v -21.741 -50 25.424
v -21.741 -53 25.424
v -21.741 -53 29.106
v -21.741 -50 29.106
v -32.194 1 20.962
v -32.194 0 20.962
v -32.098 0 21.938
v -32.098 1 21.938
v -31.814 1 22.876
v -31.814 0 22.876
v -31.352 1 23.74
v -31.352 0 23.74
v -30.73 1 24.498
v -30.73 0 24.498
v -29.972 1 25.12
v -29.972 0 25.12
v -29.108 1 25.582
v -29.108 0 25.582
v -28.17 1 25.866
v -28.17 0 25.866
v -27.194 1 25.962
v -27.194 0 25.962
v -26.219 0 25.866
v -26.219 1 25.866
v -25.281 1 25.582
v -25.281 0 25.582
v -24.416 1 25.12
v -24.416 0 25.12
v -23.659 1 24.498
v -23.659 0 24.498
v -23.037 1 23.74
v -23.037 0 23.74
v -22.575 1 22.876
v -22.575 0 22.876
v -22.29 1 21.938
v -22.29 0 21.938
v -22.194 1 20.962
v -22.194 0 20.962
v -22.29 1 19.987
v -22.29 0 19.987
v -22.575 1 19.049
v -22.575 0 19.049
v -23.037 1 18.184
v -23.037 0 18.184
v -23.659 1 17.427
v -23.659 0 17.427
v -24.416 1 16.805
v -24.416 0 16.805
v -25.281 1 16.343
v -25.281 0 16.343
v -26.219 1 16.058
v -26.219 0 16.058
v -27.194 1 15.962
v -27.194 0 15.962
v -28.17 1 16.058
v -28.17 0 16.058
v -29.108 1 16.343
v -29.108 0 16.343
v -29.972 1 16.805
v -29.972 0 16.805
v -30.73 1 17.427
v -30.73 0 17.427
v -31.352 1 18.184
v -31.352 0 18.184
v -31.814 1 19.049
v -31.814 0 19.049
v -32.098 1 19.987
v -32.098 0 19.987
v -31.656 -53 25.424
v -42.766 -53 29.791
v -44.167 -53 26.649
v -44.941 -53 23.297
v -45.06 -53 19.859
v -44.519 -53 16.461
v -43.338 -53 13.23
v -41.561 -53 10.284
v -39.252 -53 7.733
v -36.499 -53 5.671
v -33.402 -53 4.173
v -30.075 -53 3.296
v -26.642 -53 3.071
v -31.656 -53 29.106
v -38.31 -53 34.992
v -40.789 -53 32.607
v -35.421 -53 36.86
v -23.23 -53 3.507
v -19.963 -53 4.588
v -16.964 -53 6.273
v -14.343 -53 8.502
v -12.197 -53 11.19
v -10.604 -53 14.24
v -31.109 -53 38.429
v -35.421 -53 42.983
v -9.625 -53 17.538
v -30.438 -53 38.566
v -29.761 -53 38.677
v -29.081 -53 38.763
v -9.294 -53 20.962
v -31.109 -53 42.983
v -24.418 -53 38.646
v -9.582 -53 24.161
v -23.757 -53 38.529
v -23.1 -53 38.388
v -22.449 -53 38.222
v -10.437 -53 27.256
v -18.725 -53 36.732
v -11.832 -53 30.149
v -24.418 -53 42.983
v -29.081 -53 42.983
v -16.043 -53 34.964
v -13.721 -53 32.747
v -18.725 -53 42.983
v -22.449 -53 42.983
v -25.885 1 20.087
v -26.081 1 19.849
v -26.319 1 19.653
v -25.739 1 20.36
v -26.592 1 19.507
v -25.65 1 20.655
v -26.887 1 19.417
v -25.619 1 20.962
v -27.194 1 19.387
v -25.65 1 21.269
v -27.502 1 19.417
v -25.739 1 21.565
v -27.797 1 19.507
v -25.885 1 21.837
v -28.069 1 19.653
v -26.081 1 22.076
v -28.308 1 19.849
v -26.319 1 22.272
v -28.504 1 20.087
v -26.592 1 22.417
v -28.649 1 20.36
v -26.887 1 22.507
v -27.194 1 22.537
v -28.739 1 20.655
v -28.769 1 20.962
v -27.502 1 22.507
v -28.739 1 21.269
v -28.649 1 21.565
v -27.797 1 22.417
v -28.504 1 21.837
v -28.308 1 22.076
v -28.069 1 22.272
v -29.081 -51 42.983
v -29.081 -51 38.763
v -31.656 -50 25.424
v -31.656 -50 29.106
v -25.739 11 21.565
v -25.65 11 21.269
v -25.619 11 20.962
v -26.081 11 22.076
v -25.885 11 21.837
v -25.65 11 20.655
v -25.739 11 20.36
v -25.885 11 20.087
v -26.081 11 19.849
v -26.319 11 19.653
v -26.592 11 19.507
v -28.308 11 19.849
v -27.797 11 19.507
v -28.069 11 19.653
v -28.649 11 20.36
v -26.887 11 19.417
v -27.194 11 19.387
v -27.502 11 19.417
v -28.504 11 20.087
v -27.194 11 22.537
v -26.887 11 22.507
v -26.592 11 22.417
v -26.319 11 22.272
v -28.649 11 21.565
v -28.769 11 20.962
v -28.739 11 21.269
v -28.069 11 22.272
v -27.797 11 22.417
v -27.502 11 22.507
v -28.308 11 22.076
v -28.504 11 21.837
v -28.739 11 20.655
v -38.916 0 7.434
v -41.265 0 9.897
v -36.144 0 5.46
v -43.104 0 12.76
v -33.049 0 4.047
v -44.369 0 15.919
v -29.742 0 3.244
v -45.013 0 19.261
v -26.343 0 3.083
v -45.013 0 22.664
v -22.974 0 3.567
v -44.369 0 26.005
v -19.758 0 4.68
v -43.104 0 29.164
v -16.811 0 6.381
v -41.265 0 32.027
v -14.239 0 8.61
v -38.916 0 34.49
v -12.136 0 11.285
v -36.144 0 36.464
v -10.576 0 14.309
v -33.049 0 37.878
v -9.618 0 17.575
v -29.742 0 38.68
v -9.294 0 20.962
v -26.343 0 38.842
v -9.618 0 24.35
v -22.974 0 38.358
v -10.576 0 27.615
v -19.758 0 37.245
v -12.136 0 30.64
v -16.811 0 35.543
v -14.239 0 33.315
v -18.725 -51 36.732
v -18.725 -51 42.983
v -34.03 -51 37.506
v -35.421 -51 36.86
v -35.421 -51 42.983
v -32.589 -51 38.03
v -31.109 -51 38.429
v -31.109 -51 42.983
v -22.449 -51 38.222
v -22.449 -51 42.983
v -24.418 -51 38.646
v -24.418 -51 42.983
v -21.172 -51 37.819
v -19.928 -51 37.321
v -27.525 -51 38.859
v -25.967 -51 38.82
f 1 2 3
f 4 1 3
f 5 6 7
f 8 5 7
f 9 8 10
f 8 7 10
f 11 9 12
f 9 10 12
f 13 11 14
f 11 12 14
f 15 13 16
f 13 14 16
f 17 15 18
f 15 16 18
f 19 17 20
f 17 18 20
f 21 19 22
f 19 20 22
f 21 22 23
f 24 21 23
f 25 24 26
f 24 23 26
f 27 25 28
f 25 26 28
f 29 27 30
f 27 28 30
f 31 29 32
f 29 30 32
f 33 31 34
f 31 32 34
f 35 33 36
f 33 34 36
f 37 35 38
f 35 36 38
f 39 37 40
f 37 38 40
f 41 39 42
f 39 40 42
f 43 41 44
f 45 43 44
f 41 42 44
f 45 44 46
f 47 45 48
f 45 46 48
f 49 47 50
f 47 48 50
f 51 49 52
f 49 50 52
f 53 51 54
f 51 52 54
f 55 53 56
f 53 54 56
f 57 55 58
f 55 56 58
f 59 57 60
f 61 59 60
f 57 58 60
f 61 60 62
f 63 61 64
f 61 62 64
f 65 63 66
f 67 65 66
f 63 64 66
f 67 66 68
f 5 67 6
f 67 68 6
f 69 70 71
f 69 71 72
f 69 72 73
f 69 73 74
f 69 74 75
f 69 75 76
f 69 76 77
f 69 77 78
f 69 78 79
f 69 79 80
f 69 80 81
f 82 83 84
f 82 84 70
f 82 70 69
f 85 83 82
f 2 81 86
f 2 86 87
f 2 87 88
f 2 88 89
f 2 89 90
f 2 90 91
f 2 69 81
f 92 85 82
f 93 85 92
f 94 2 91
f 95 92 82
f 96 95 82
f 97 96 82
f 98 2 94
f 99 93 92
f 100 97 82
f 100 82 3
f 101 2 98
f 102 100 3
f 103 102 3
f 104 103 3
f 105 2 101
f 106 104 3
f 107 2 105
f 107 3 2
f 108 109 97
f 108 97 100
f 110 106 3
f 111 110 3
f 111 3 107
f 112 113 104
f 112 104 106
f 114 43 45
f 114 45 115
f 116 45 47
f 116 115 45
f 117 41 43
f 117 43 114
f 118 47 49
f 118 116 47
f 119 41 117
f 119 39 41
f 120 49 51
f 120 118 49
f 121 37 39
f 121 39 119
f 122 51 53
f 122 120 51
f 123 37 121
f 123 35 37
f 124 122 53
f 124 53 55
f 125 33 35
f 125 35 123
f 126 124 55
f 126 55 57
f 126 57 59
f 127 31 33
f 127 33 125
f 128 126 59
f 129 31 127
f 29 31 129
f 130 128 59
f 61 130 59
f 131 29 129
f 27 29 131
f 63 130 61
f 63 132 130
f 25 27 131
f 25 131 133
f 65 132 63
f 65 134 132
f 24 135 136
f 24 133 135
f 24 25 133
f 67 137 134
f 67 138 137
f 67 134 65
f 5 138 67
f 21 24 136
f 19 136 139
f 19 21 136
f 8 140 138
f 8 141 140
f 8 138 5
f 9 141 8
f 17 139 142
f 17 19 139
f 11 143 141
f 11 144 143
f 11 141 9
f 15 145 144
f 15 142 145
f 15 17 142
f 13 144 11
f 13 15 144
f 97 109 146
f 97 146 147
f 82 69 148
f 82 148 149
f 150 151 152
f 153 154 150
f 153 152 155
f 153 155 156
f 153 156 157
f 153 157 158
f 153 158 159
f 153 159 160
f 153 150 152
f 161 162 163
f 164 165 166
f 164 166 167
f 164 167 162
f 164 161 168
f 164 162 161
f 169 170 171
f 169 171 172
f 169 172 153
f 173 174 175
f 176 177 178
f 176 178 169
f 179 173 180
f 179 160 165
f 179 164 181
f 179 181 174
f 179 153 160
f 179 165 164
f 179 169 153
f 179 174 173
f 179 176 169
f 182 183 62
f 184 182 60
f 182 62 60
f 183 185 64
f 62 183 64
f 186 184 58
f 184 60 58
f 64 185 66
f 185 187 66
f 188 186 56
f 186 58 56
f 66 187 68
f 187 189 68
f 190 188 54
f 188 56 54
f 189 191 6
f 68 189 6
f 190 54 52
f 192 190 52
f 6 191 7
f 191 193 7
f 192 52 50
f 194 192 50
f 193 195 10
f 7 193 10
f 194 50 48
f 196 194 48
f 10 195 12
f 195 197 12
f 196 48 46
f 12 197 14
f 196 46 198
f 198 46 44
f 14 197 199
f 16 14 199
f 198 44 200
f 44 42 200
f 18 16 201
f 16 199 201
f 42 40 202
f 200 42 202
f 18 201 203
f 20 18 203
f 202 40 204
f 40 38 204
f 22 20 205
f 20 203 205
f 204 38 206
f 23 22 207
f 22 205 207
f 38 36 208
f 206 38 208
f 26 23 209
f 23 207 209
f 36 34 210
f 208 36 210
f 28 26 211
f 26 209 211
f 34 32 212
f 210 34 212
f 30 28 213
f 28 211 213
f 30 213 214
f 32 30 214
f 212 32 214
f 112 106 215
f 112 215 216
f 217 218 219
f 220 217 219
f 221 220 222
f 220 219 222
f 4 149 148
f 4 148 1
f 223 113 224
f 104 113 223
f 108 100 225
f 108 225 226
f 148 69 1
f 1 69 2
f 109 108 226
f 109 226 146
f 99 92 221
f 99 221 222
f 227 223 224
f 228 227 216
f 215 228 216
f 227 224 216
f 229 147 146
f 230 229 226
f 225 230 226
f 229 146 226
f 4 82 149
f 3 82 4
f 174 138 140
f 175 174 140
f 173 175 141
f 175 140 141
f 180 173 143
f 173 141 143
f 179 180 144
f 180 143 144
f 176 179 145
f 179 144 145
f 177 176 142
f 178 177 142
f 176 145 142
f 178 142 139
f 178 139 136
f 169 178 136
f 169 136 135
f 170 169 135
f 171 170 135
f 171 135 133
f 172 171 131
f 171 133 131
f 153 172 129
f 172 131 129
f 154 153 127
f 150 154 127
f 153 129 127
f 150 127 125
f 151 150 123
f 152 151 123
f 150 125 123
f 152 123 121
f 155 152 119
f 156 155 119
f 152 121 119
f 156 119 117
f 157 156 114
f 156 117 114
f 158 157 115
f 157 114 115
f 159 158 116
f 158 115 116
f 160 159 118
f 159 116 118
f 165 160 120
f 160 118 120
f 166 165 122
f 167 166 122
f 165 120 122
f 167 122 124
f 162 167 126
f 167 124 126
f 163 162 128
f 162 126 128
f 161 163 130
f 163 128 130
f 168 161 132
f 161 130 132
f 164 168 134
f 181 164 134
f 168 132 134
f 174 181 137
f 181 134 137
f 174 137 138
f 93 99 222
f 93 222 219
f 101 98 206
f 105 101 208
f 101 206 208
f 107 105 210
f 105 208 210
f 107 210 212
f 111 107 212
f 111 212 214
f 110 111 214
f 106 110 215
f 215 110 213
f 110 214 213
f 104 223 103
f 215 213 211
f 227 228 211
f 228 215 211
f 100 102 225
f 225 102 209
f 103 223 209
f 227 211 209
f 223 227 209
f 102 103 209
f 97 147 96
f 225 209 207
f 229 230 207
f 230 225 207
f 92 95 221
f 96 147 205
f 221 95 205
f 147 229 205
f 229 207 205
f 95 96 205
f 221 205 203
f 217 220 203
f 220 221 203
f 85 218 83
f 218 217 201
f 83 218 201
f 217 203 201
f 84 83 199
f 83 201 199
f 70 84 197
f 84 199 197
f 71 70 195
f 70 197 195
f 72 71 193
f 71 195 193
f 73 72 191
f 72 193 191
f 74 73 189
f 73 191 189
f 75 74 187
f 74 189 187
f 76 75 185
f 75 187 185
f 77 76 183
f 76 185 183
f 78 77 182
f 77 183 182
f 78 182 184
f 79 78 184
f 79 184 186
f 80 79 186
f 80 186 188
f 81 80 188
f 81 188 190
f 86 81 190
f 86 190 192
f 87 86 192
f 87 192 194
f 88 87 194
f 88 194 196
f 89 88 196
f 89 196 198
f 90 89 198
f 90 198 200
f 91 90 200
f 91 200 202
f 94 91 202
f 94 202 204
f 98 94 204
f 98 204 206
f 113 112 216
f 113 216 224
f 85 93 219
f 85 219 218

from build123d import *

# Parameters (mm, degrees)
F0_R     = 17.9
F1_DEPTH = 53
F2_R     = 5
F3_DEPTH = 1
F4_R     = 1.575
F5_DEPTH = 10
F6_W     = 9.9145695567
F6_H     = 3.6825537682
F7_DEPTH = 3
F9_DEPTH = 2


with BuildPart() as f1:
    # F0 (on Front) → F1 (new body)
    with BuildSketch(Plane.XZ):
        with Locations((-27.1942447871, 20.9622308612)):
            Circle(F0_R)
    extrude(amount=F1_DEPTH)

    # F2 (on face) → F3 (join)
    with BuildSketch(Plane(origin=(0, 0, 0), x_dir=(-1, 0, 0), z_dir=(0, 1, 0))):
        with Locations((27.1942447871, 20.9622308612)):
            Circle(F2_R)
    extrude(amount=F3_DEPTH)

    # F4 (on face) → F5 (join)
    with BuildSketch(Plane(origin=(0, 1, 0), x_dir=(-1, 0, 0), z_dir=(0, 1, 0))):
        with Locations((27.1942447871, 20.9622308612)):
            Circle(F4_R)
    extrude(amount=F5_DEPTH)

    # F6 (on face) → F7 (cut)
    with BuildSketch(Plane.XZ.offset(53)):
        with Locations((-26.6985148191, 27.265066281)):
            Rectangle(F6_W, F6_H)
    extrude(amount=-F7_DEPTH, mode=Mode.SUBTRACT)

    # F8 (on face) → F9 (join)
    with BuildSketch(Plane.XZ.offset(53)):
        with BuildLine():
            Line((-35.4207989488, 42.9829595067), (-35.4207989488, 36.8598346626))
            ThreePointArc((-35.4207989488, 36.8598346626), (-33.3154303096, 37.7830836279), (-31.1090964824, 38.428882979))
            Line((-31.1090964824, 38.428882979), (-31.1090964824, 42.9829595067))
            Line((-31.1090964824, 42.9829595067), (-35.4207989488, 42.9829595067))
        make_face()
        with BuildLine():
            Line((-29.0810409933, 42.9829595067), (-29.0810409933, 38.76251176))
            ThreePointArc((-29.0810409933, 38.76251176), (-26.7457383718, 38.8566110403), (-24.4180820882, 38.6456389227))
            Line((-24.4180820882, 38.6456389227), (-24.4180820882, 42.9829595067))
            Line((-24.4180820882, 42.9829595067), (-29.0810409933, 42.9829595067))
        make_face()
        with BuildLine():
            ThreePointArc((-22.4494244903, 38.2219145301), (-20.5451738039, 37.5814924291), (-18.7246836722, 36.7317119725))
            Line((-18.7246836722, 36.7317119725), (-18.7246836722, 42.9829595067))
            Line((-18.7246836722, 42.9829595067), (-22.4494244903, 42.9829595067))
            Line((-22.4494244903, 42.9829595067), (-22.4494244903, 38.2219145301))
        make_face()
    extrude(amount=-F9_DEPTH)


solid = f1.part
